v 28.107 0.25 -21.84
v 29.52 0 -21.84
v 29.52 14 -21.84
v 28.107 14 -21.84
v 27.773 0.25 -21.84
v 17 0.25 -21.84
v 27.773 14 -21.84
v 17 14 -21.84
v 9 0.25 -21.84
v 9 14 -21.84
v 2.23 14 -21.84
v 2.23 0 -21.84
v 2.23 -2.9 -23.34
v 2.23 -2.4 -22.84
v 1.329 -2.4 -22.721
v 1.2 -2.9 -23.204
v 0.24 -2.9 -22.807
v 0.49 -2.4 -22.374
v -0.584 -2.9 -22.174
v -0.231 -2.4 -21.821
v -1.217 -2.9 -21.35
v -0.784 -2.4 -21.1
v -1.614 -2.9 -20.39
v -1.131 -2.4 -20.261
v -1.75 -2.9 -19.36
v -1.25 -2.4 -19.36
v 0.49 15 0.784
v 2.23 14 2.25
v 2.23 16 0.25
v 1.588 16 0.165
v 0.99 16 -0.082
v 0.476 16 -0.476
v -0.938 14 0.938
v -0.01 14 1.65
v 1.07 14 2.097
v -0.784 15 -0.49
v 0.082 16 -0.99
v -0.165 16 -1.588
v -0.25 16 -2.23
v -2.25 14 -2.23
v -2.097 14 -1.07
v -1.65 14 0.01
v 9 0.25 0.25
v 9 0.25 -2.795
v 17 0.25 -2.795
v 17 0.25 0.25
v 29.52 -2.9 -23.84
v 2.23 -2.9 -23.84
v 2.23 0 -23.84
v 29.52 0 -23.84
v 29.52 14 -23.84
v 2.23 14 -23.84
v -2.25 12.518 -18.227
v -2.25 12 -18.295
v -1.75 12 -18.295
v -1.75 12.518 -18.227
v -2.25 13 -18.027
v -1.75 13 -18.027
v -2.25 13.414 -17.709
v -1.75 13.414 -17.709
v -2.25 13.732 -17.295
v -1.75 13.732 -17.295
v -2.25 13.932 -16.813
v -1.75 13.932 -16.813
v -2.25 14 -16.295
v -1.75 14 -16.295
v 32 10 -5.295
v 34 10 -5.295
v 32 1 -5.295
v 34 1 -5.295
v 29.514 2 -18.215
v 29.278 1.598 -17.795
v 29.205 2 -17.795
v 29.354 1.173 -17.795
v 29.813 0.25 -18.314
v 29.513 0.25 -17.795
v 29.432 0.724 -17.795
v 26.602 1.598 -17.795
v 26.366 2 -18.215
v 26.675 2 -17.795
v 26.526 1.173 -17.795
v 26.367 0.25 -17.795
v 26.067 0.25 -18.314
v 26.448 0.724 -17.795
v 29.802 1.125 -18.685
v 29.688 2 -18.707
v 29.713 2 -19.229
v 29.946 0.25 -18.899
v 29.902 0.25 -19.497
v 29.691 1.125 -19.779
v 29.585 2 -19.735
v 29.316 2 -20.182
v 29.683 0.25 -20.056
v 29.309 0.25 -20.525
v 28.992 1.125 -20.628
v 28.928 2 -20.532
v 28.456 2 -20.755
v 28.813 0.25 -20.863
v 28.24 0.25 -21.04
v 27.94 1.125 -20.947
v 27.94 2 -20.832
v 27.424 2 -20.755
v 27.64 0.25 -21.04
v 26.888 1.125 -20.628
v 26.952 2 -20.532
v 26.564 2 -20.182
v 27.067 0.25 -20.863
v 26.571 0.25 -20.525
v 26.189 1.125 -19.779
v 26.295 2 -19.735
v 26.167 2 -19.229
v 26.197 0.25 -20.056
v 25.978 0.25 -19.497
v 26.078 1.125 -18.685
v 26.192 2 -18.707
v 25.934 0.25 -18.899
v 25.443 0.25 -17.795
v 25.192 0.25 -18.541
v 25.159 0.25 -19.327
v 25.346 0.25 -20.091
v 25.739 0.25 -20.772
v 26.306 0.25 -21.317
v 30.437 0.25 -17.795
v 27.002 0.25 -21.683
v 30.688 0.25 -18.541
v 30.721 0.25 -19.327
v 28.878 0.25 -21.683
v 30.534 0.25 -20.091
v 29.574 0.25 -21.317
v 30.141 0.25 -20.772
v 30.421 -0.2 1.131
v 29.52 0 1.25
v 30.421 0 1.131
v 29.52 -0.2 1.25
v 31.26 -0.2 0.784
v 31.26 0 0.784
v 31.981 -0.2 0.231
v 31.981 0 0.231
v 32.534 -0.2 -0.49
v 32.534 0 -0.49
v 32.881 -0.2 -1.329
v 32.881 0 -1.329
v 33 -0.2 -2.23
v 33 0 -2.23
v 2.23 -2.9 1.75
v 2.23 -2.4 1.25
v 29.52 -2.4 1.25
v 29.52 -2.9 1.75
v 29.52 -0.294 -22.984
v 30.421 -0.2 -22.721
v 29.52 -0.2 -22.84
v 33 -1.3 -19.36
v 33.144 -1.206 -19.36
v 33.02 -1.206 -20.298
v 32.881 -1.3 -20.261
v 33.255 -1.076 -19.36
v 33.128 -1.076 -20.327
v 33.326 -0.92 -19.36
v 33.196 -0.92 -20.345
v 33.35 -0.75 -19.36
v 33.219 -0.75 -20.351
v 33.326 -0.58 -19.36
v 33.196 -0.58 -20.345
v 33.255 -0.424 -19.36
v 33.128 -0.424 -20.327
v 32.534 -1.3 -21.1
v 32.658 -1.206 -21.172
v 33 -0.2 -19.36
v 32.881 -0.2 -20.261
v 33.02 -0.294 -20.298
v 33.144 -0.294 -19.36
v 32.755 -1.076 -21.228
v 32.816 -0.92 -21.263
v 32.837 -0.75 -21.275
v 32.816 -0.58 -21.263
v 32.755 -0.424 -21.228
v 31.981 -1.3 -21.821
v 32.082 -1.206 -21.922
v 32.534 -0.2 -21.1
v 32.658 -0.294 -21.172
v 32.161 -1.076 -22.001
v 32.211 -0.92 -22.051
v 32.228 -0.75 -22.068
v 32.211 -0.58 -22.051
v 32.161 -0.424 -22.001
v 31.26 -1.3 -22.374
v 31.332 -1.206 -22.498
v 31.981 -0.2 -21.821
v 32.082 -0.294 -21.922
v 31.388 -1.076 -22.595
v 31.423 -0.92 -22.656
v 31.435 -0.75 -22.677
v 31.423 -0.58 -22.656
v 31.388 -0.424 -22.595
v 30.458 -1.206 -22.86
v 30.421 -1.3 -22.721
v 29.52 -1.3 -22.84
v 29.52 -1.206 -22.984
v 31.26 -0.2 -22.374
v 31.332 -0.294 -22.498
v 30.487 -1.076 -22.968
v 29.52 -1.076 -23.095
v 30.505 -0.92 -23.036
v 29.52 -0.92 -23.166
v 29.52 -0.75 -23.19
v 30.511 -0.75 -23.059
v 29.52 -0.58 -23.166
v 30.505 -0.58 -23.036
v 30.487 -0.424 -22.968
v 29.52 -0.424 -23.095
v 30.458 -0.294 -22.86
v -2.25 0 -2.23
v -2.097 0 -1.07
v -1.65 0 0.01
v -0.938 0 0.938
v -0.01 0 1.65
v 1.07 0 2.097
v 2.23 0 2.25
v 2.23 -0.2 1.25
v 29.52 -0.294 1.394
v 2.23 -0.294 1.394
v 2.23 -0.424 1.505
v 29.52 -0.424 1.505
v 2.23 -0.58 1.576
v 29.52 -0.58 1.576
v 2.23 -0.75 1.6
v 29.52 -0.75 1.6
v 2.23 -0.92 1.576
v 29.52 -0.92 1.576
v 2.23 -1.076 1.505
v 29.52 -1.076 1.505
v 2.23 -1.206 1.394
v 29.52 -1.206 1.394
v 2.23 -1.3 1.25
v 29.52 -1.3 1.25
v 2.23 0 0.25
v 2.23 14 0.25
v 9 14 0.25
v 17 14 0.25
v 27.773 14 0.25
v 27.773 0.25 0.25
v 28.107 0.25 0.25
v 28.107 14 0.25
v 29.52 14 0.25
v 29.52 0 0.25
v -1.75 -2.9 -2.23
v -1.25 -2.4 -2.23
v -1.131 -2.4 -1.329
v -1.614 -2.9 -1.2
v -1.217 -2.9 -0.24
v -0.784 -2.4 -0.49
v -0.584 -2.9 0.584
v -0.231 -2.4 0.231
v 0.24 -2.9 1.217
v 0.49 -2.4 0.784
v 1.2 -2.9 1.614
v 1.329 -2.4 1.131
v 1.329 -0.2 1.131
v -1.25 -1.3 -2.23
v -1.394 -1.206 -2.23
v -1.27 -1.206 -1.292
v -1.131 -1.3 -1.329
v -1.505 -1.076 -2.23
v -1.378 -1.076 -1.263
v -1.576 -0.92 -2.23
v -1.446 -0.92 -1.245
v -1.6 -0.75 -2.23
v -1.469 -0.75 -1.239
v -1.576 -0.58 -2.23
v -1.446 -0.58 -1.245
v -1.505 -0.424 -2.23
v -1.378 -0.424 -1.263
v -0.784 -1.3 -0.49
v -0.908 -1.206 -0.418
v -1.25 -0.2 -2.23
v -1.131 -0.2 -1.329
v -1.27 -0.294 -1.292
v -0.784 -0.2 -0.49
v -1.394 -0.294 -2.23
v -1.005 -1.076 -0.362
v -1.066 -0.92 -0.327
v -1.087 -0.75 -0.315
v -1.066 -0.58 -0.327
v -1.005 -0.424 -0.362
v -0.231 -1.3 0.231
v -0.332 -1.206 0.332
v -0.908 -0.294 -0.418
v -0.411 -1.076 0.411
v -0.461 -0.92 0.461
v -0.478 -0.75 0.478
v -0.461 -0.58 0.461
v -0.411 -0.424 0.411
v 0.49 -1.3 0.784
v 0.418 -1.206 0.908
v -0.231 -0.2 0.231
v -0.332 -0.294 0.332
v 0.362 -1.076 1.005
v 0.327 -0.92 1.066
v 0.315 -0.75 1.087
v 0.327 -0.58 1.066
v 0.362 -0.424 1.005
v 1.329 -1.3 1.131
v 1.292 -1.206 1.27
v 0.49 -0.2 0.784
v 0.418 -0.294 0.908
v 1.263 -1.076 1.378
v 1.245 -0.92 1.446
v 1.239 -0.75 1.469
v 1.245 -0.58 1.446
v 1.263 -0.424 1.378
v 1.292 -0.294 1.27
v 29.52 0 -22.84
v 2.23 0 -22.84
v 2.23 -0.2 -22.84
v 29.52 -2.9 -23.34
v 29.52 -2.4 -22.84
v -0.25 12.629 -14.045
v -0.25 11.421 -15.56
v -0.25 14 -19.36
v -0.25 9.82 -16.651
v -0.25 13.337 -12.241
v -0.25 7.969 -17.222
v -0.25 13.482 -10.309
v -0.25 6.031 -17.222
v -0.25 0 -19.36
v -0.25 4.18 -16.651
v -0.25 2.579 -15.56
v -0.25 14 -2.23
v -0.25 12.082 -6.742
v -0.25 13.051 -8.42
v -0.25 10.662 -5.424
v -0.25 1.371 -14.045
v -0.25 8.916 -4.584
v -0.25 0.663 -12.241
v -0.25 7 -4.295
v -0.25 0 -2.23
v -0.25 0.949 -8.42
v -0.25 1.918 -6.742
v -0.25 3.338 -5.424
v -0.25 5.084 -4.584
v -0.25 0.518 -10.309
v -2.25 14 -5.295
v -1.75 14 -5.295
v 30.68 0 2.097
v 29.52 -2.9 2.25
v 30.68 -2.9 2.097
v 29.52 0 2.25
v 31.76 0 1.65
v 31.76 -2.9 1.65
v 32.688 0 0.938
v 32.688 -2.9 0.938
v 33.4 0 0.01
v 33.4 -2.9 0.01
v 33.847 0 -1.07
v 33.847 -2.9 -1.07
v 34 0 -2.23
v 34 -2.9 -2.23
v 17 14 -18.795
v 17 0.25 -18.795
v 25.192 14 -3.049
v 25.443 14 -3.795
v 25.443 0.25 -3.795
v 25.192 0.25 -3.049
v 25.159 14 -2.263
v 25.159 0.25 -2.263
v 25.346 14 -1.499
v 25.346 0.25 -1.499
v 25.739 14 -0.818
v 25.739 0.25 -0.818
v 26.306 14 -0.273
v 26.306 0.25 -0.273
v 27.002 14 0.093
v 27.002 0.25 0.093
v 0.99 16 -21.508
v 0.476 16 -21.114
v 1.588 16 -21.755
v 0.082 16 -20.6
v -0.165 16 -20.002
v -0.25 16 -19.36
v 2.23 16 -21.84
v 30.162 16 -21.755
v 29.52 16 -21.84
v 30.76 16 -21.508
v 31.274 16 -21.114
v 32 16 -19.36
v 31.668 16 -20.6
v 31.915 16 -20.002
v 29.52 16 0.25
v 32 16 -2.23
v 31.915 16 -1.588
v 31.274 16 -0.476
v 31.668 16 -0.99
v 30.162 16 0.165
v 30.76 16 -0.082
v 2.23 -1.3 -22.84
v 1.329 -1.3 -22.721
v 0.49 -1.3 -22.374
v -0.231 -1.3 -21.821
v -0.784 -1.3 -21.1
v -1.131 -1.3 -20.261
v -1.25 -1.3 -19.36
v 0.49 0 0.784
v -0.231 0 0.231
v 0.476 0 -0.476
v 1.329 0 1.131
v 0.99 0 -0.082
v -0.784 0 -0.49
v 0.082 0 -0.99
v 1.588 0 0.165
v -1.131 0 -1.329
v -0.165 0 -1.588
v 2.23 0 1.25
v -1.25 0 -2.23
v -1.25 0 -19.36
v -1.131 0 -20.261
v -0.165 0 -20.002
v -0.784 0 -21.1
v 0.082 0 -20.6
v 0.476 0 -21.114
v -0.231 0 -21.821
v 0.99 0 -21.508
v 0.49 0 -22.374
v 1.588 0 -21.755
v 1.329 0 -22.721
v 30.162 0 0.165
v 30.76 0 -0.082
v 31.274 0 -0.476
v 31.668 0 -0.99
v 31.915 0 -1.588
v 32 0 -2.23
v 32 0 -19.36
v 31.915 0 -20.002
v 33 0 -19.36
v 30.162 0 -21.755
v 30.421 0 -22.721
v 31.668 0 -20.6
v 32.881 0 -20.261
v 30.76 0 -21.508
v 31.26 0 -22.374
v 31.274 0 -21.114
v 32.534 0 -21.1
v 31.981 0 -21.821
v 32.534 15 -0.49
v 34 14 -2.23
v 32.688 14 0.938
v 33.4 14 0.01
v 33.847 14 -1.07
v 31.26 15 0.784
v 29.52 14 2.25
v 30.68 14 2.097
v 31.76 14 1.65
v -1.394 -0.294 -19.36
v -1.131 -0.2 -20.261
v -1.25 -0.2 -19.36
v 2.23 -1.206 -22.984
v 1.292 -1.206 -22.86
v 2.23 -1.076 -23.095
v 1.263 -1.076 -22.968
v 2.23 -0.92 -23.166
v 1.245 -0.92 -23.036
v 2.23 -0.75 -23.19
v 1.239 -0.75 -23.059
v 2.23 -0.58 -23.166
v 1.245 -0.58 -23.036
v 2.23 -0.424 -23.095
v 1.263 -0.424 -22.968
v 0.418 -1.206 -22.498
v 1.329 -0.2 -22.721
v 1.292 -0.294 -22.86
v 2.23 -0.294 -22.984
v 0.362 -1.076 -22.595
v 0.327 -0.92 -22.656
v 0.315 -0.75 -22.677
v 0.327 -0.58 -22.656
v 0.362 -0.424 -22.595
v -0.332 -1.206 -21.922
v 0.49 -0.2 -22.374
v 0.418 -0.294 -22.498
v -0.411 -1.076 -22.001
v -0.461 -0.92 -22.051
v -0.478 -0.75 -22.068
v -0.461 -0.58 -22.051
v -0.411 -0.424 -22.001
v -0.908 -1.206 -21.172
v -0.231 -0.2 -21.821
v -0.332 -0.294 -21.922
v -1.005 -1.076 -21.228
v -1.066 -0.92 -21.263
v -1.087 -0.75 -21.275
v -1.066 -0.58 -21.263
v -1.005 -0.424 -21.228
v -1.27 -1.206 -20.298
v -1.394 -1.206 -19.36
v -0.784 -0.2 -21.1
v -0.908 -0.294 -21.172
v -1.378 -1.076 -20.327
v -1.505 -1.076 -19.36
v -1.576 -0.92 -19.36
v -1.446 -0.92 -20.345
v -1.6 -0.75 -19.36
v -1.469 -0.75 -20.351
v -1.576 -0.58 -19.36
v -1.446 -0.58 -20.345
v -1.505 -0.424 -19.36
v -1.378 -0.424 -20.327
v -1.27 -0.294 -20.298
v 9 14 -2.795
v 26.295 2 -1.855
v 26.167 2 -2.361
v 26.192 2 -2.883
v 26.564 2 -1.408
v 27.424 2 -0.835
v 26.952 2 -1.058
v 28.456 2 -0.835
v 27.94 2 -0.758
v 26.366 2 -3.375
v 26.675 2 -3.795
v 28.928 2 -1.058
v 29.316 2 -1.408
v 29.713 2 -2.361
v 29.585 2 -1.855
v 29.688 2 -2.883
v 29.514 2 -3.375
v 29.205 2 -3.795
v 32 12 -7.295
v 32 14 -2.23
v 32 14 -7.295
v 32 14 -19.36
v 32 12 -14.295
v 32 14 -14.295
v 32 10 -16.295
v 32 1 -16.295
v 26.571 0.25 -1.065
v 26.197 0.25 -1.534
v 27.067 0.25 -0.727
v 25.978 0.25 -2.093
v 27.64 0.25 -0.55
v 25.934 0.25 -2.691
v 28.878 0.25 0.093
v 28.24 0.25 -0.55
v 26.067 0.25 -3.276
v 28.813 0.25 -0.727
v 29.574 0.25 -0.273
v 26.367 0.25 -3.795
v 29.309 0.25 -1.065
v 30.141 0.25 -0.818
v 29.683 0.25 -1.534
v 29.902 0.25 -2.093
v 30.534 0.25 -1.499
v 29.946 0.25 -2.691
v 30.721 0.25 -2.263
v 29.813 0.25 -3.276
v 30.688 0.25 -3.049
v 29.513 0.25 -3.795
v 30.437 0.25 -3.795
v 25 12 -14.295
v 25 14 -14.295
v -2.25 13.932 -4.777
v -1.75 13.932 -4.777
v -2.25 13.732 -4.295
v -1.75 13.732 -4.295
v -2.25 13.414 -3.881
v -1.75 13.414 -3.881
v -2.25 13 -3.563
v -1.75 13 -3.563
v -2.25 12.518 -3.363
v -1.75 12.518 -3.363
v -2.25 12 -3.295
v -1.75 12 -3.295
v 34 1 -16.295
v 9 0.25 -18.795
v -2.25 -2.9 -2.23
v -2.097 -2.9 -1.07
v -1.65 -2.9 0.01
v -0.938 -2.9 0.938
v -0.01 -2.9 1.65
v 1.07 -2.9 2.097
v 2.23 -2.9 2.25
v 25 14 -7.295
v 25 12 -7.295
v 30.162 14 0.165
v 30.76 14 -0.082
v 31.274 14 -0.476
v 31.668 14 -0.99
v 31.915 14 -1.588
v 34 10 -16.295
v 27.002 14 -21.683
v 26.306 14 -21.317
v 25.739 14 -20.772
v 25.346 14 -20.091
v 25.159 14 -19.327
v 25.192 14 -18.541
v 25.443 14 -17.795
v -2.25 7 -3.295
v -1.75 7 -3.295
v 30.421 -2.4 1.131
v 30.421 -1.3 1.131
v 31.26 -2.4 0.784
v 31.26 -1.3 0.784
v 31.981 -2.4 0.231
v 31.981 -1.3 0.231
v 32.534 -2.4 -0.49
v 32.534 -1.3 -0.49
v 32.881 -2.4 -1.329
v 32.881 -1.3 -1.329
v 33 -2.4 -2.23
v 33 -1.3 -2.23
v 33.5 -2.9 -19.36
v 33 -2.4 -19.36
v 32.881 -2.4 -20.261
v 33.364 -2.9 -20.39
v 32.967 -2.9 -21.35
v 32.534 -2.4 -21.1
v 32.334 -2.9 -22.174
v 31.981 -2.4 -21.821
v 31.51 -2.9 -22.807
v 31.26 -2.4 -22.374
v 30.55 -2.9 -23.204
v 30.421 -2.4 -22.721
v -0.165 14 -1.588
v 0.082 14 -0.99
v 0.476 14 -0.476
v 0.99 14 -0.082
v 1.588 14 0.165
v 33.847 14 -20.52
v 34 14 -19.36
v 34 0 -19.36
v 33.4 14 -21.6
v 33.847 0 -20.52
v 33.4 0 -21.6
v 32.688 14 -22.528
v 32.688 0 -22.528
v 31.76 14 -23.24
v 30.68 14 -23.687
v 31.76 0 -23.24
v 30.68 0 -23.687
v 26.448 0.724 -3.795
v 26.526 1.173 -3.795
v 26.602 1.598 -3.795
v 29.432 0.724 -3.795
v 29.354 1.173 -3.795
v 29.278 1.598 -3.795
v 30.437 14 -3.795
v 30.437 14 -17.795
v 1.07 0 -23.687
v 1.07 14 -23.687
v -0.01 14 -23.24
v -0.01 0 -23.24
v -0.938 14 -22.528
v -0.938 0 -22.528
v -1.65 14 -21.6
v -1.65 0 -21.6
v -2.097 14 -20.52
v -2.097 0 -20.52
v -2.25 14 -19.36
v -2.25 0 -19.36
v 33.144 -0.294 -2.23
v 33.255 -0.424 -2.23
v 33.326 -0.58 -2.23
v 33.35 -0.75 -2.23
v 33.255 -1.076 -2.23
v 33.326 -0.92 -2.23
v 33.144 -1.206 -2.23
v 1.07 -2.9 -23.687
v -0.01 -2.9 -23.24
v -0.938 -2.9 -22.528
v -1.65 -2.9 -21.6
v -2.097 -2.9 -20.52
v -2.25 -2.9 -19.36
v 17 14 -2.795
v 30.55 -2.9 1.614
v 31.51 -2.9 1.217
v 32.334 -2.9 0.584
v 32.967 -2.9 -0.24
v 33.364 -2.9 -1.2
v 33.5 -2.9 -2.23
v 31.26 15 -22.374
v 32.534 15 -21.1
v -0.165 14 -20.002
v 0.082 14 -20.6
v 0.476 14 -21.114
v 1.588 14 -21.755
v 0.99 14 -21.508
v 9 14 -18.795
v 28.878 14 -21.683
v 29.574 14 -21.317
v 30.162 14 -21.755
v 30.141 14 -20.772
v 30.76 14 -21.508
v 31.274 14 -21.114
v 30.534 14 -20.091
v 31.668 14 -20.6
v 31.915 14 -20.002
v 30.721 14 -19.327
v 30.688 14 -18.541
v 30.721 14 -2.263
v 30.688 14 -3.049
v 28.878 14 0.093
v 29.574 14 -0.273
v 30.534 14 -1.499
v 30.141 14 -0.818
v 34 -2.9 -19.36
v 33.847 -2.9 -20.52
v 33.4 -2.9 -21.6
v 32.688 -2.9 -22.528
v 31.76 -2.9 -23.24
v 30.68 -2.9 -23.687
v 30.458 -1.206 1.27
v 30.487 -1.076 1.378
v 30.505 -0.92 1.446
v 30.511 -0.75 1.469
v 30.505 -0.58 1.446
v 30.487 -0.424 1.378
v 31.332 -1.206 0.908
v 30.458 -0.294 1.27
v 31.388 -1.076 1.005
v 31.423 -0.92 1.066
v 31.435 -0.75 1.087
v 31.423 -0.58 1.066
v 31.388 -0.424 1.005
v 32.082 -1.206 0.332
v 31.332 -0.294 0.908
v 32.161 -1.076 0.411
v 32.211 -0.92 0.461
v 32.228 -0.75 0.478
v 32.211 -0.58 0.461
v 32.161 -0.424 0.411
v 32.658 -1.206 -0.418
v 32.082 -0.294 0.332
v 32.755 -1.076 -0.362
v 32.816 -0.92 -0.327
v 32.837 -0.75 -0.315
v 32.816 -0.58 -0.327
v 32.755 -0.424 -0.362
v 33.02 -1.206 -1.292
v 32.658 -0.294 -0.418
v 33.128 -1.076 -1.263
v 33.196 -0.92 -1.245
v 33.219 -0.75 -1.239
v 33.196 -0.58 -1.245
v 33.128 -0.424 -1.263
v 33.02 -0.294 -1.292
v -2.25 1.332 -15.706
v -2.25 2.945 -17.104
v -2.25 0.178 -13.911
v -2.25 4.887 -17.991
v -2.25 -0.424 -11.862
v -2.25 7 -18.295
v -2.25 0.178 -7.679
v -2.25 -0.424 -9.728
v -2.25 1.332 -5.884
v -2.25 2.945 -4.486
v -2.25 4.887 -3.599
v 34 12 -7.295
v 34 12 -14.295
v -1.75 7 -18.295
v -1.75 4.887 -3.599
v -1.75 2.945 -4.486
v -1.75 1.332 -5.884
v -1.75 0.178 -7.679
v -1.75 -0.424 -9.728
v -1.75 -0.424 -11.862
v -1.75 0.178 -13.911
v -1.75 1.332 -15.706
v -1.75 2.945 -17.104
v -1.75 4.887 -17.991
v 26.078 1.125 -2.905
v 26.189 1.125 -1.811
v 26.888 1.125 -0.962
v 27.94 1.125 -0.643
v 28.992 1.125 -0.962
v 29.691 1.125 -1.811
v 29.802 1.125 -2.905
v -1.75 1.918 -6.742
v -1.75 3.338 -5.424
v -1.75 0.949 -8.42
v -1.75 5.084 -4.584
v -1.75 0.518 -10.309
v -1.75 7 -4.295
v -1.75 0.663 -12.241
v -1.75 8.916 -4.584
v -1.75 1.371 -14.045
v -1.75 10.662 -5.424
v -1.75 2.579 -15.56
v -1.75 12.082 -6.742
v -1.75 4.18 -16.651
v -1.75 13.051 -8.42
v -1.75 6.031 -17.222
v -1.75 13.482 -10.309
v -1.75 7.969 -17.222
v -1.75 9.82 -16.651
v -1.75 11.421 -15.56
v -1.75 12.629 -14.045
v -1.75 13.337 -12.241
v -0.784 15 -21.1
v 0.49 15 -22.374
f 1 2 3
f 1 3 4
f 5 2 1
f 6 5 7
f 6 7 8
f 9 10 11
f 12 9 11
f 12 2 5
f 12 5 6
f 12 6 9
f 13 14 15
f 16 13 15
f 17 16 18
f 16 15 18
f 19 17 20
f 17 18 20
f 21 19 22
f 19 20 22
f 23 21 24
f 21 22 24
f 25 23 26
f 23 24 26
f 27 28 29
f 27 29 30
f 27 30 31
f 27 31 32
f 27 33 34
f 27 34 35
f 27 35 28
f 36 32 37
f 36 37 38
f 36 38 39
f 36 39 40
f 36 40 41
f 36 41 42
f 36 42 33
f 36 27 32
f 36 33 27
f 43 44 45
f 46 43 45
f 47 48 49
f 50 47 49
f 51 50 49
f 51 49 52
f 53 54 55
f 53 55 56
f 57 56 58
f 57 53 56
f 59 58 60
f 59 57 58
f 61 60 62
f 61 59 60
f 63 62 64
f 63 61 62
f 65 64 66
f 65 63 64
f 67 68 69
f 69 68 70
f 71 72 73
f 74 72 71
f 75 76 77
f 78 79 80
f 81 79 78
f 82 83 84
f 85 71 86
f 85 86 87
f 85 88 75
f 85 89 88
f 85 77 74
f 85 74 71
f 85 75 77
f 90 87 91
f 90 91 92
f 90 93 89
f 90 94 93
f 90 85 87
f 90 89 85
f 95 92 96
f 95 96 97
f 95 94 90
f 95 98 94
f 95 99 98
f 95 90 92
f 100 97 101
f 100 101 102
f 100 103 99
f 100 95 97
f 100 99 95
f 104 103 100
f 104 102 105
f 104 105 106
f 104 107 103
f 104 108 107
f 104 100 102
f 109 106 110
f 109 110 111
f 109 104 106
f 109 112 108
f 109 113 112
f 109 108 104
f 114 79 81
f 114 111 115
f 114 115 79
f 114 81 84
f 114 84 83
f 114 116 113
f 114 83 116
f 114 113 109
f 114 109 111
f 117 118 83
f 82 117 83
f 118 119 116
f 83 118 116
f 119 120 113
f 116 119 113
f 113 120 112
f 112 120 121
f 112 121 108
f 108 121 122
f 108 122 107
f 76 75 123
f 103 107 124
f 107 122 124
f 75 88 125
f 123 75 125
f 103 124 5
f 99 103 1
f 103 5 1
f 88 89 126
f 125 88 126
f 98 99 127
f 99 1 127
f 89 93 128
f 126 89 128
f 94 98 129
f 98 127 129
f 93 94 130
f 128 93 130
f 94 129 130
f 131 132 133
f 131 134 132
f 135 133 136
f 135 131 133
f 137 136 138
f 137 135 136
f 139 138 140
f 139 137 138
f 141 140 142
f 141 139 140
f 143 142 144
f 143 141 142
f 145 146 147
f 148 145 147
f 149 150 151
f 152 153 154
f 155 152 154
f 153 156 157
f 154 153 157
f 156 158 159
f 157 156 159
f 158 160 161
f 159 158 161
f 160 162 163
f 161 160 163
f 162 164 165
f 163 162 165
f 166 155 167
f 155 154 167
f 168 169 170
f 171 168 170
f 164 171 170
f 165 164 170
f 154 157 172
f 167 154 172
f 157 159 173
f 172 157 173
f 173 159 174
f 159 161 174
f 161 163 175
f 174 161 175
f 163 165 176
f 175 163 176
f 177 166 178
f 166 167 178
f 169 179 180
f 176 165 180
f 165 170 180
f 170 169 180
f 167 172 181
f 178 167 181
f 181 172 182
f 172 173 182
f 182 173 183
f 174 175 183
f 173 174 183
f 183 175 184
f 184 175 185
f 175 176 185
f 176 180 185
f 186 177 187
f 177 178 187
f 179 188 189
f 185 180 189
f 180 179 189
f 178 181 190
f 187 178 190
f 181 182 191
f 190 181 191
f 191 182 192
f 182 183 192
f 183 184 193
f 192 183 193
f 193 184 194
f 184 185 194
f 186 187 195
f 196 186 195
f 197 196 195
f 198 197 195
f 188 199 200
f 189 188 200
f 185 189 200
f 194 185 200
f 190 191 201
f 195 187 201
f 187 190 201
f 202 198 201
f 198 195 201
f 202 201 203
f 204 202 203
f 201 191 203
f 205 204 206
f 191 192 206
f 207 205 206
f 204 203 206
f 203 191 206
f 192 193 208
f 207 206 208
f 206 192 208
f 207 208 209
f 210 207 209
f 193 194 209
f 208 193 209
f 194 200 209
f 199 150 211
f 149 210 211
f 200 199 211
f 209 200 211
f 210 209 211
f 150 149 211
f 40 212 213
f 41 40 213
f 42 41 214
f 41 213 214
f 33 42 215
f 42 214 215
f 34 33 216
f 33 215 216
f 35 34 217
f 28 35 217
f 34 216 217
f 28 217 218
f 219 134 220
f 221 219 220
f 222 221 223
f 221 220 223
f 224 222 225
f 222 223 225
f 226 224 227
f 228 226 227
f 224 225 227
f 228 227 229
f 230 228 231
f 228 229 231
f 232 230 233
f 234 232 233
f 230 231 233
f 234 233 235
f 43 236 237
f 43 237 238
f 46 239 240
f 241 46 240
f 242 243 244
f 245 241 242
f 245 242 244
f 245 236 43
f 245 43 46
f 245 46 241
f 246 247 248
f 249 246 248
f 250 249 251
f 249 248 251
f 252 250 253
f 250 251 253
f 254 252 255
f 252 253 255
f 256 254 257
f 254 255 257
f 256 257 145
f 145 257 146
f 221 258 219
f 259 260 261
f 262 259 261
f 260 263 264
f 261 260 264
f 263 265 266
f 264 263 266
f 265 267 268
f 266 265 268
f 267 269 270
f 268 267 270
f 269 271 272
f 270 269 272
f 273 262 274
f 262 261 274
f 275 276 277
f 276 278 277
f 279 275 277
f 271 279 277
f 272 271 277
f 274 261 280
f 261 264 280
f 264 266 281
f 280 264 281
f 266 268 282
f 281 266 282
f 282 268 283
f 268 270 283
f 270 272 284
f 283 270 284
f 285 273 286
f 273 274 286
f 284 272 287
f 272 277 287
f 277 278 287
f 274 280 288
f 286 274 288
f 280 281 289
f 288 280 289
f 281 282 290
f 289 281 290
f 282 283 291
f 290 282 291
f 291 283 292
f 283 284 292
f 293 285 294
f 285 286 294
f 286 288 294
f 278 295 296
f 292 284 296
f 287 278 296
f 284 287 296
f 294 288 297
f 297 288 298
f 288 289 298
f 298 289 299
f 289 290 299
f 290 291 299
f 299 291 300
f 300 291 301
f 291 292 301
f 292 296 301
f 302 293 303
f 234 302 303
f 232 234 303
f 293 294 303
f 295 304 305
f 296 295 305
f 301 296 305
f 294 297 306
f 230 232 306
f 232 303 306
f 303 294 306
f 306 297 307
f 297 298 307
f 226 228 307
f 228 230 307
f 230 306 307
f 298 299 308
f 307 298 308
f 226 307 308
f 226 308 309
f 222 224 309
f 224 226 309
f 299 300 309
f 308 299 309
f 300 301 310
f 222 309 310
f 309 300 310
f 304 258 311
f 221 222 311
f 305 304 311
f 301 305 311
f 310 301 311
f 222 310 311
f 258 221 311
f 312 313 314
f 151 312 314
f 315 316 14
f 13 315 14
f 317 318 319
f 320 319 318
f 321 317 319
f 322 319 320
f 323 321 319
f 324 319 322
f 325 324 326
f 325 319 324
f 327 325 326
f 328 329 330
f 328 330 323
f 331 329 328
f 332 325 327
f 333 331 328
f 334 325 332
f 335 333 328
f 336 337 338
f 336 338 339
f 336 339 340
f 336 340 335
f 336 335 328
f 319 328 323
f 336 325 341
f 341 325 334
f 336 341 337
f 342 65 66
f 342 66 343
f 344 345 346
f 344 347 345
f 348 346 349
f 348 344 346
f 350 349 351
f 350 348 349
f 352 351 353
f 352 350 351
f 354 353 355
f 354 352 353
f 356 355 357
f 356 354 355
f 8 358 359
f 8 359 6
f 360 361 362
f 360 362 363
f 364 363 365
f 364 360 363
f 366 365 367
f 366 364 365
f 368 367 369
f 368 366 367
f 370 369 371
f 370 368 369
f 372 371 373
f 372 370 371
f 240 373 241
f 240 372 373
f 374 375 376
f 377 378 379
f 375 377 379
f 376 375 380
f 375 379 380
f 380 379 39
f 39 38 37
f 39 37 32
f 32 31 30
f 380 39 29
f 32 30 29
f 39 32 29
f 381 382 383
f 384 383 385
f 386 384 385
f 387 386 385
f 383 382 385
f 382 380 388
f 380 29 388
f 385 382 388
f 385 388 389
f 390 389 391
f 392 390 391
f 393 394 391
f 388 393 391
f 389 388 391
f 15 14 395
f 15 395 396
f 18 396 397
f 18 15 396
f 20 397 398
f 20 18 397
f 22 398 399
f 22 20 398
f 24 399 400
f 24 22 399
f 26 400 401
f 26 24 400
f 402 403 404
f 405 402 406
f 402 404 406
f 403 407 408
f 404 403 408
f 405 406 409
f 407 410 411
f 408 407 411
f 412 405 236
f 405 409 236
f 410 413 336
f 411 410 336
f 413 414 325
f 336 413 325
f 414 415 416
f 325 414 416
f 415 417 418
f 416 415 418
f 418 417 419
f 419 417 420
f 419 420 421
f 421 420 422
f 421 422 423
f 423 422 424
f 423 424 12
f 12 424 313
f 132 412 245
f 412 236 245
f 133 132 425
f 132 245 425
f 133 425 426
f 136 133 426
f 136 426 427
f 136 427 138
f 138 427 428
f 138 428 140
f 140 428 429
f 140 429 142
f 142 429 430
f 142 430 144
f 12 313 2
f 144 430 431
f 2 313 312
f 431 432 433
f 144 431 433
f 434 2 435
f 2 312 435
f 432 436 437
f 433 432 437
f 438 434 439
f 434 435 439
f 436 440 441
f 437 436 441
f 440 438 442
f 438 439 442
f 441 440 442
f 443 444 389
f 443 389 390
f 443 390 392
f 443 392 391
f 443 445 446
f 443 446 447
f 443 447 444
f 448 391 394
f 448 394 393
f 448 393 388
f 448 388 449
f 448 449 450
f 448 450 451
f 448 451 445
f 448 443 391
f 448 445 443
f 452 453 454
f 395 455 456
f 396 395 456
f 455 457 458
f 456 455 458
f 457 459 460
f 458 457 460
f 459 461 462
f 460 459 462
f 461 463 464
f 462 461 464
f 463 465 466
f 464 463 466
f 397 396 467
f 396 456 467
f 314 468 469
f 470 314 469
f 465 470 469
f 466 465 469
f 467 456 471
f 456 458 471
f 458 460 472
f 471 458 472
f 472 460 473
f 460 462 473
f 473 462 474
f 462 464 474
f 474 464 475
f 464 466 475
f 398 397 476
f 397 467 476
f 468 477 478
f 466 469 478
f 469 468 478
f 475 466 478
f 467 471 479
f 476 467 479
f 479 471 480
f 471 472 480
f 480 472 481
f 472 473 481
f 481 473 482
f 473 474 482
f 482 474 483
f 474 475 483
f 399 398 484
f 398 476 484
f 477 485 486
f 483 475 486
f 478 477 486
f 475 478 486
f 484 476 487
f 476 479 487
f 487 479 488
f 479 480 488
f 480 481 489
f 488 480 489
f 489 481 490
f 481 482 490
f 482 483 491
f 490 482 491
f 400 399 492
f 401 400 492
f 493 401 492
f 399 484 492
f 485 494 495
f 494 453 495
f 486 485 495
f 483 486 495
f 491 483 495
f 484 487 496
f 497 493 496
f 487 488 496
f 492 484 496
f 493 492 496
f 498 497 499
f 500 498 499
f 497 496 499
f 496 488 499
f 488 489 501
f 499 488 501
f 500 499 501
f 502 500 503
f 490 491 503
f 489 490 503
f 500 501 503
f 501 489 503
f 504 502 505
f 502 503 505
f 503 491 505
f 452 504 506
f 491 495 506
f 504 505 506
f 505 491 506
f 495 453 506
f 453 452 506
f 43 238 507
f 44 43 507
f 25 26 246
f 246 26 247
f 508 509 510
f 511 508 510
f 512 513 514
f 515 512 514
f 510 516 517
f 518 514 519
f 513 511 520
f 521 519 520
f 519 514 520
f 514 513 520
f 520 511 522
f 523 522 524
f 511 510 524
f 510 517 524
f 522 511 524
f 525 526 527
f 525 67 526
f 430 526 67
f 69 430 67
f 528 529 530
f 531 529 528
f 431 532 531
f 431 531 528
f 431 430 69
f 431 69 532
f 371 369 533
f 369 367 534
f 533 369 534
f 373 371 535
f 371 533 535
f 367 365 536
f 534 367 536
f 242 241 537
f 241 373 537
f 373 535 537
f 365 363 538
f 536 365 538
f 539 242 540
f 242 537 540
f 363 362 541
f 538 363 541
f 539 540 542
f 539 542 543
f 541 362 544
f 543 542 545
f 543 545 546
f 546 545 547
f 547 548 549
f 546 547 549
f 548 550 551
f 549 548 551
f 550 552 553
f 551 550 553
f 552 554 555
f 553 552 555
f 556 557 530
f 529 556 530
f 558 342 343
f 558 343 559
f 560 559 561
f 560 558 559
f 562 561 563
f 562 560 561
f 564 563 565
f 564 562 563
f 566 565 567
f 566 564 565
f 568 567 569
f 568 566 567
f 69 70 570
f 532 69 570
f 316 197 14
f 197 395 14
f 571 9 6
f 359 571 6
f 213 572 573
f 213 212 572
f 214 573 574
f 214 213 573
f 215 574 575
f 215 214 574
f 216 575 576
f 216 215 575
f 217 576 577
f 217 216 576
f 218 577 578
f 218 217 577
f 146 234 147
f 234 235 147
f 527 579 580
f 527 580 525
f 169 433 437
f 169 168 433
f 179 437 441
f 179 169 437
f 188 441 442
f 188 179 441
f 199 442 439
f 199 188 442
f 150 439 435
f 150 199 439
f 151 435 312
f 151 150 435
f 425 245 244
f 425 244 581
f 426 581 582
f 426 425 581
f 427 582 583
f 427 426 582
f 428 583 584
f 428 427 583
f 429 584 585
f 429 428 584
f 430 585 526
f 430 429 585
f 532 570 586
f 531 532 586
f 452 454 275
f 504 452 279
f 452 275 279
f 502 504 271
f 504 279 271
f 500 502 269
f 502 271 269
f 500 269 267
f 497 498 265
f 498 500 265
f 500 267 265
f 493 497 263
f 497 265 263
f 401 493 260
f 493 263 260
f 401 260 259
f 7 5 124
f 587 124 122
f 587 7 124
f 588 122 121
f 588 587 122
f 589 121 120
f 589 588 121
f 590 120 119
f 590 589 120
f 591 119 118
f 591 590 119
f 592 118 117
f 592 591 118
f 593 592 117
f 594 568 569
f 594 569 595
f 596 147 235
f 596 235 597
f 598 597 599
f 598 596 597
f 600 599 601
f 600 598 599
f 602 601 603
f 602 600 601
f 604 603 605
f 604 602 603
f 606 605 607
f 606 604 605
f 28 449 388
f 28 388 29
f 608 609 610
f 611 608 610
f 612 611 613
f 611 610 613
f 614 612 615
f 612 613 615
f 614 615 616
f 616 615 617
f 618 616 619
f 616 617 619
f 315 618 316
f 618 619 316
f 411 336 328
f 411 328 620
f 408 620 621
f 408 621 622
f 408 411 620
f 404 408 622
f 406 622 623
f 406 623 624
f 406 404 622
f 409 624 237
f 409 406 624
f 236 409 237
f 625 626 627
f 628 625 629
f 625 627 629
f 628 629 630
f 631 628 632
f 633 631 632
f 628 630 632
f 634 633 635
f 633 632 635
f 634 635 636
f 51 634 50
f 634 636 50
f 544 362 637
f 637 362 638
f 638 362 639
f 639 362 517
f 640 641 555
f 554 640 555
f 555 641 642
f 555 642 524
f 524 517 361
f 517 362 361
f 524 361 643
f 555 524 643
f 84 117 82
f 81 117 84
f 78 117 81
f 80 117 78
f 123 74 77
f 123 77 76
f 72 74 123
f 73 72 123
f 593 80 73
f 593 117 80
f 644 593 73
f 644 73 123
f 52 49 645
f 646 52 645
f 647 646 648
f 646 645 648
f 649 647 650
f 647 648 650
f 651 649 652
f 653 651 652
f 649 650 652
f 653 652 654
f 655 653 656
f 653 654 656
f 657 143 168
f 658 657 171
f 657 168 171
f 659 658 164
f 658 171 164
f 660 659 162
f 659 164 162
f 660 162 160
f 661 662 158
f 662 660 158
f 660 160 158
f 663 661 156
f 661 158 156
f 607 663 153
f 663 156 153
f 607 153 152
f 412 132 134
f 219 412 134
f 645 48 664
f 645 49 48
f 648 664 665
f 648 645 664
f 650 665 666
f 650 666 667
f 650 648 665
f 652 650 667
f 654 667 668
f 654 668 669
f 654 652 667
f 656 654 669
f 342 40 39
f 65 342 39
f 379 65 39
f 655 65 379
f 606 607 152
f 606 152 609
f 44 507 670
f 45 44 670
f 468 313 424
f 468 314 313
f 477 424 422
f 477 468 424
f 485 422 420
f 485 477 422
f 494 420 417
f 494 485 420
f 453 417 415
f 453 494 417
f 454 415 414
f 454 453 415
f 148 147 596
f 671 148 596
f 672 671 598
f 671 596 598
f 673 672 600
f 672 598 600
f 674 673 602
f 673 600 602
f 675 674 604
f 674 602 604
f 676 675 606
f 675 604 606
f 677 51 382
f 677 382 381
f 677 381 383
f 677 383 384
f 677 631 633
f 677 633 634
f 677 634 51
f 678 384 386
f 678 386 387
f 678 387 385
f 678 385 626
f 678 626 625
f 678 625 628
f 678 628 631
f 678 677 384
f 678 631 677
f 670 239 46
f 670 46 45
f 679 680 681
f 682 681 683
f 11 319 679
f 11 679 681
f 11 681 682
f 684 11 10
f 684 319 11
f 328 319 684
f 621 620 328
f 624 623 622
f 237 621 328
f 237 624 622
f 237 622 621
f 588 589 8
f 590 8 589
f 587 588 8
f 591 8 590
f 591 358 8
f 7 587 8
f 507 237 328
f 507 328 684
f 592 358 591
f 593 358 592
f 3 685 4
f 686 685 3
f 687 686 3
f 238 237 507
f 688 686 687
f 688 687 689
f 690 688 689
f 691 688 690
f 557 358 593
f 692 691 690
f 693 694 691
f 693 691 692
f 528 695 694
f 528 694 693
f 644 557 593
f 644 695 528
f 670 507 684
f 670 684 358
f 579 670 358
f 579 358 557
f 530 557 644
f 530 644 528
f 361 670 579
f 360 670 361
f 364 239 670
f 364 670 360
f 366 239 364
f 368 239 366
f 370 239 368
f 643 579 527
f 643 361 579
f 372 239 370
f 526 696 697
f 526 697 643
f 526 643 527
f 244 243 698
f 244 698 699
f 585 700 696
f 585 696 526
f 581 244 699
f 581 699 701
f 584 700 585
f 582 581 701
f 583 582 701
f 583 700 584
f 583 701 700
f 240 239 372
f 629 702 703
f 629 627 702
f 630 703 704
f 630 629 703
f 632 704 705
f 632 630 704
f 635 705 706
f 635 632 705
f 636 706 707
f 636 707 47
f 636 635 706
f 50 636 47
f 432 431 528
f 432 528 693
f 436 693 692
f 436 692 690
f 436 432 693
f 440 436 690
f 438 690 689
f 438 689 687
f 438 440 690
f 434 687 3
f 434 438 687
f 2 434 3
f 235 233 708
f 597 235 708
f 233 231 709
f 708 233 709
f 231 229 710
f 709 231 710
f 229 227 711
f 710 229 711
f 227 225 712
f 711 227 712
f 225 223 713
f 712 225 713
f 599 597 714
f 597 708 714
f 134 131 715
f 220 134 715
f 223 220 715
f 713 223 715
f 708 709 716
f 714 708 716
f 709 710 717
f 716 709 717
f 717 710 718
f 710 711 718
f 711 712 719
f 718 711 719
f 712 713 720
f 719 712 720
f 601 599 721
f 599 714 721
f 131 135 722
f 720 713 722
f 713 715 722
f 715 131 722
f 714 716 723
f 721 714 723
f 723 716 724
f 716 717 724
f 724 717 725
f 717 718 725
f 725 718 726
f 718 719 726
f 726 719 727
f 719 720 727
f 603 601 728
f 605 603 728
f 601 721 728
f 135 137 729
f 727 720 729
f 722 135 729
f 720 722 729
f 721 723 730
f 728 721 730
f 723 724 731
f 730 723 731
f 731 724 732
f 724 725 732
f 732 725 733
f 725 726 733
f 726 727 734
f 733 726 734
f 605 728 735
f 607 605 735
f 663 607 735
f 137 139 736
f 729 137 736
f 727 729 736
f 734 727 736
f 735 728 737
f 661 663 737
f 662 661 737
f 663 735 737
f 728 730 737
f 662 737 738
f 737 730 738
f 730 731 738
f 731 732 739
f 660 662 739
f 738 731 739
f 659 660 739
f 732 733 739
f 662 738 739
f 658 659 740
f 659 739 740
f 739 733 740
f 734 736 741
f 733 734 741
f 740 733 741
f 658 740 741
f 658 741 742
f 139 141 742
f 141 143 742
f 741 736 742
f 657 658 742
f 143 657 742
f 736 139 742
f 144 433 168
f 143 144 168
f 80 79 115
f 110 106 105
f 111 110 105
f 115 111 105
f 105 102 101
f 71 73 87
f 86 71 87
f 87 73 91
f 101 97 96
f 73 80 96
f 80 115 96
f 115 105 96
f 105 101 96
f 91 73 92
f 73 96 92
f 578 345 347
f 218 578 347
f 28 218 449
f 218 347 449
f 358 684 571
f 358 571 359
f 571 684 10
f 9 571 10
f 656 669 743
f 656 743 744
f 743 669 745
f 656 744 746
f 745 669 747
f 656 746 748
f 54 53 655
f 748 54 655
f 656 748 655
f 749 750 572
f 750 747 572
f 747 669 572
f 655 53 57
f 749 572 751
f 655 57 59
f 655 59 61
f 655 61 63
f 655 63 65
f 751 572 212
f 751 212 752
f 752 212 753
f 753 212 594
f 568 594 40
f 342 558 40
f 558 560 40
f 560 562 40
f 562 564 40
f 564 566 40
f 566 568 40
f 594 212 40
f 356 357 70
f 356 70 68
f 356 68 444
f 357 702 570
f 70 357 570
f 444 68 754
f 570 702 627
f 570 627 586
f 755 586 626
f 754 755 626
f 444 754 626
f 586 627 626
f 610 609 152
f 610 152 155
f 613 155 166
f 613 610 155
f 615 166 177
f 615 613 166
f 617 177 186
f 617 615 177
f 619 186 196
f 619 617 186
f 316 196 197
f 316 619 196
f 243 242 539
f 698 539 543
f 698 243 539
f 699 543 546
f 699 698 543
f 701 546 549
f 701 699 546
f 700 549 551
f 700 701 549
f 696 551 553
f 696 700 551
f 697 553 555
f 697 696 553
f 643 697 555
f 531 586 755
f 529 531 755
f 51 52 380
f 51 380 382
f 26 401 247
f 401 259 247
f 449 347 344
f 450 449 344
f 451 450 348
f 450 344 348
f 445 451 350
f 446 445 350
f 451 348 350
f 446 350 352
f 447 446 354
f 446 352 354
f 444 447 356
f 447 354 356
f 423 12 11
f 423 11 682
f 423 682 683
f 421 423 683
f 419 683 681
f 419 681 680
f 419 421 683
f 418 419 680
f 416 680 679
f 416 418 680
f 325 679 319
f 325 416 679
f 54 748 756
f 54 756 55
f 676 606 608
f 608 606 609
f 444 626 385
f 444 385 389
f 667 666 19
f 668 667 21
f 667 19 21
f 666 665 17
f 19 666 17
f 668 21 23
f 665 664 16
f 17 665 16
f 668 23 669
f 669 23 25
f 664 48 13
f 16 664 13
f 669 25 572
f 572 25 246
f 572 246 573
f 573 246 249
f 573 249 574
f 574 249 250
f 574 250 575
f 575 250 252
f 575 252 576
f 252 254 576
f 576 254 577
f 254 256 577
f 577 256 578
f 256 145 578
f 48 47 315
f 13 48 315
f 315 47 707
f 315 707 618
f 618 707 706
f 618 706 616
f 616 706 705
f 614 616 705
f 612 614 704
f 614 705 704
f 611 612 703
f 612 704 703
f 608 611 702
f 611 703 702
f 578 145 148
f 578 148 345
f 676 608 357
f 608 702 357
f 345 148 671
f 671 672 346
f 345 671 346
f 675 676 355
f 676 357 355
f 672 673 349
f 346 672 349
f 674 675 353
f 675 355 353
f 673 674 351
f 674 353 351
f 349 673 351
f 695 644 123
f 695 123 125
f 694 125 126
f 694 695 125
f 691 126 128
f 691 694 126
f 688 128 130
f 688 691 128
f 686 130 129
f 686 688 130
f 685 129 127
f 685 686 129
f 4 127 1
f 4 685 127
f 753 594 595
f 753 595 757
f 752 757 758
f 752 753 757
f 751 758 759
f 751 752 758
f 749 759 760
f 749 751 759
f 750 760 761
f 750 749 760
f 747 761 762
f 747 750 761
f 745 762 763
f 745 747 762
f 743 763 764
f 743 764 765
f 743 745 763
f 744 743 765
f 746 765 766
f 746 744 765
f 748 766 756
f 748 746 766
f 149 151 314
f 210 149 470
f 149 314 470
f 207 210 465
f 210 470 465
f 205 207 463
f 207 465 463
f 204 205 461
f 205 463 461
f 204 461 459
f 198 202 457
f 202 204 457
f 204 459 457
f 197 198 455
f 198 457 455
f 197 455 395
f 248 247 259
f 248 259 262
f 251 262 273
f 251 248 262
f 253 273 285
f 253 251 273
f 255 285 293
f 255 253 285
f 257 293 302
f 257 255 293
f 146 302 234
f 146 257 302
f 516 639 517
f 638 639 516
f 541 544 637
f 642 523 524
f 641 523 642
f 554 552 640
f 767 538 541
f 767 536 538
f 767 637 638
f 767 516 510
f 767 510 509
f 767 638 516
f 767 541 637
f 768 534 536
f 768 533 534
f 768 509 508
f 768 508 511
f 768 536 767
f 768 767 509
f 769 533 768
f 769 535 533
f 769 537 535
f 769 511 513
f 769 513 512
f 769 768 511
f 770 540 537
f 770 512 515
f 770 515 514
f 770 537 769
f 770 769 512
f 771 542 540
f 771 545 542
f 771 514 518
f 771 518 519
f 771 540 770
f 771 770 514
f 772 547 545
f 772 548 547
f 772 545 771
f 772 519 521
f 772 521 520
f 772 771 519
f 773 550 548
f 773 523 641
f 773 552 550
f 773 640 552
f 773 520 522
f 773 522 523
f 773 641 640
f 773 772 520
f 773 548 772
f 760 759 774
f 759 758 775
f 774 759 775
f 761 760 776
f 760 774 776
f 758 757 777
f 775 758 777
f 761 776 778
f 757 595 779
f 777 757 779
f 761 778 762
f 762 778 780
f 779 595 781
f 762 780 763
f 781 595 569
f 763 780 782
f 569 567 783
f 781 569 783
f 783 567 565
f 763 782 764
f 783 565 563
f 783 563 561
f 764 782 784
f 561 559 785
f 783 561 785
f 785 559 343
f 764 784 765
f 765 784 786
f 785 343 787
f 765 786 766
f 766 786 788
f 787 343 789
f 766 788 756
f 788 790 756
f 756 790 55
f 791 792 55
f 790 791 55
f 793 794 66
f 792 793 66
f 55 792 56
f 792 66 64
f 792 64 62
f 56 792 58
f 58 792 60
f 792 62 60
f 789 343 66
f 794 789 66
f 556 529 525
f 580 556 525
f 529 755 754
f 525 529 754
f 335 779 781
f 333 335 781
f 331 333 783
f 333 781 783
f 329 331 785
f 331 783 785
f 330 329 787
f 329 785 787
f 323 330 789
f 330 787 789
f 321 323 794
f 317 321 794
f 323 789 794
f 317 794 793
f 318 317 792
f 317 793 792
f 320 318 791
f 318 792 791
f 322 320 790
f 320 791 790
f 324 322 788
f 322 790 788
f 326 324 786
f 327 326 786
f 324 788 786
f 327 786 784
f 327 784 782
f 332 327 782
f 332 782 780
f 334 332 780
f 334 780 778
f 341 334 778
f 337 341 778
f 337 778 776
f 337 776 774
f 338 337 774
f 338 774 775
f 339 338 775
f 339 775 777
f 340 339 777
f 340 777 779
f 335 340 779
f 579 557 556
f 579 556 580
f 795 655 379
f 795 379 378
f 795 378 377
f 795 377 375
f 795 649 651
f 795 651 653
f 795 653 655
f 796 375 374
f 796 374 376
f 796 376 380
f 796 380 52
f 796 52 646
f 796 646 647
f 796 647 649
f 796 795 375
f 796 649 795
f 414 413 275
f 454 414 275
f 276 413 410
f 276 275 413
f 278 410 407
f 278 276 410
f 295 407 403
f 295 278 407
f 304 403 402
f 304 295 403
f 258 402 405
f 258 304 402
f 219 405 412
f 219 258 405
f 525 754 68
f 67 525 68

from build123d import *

# Parameters (mm, degrees)
MAIN_EXTRUSION_DEPTH             = 14
TAPERED_BOTTOM_DEPTH             = 2
TAPERED_BOTTOM_DRAFT             = -45
SKETCH4_R                        = 2.795
SKETCH4_W                        = 8
SKETCH4_H                        = 3.045
PCB_SUPPORT_DEPTH                = 13.75
SKETCH5_R                        = 2.045
GUIDE_PIN_CUTOUT_DEPTH           = 2
GUIDE_PIN_CUTOUT_DRAFT           = 7.5
GUIDE_PIN_CUTOUT_PROFILE_2_DEPTH = 2
GUIDE_PIN_CUTOUT_PROFILE_2_DRAFT = 7.5
SKETCH12_W                       = 4.994797294
SKETCH12_H                       = 14
CUT_EXTRUDE6_DEPTH               = 13.75
SKETCH11_W                       = 7
SKETCH11_H                       = 7
BOSS_EXTRUDE1_DEPTH              = 2
CUT_EXTRUDE2_REACH               = 48.243
SKETCH8_R                        = 6.5
CUT_EXTRUDE4_DEPTH               = 0.5
CUT_EXTRUDE5_REACH               = 48.243
CHAMFER1_SIZE                    = 0.5


with BuildPart() as part:
    # Sketch2 → main-extrusion (new body)
    with BuildSketch(Plane(origin=(0, 0, 0), x_dir=(1, 0, 0), z_dir=(0, 1, 0))):
        with BuildLine():
            Line((-2.25, 19.36), (-2.25, 2.23))
            ThreePointArc((-2.25, 2.23), (-0.93783838, -0.93783838), (2.23, -2.25))
            Line((2.23, -2.25), (29.52, -2.25))
            ThreePointArc((29.52, -2.25), (32.68783838, -0.93783838), (34, 2.23))
            Line((34, 2.23), (34, 19.36))
            ThreePointArc((34, 19.36), (32.68783838, 22.52783838), (29.52, 23.84))
            Line((29.52, 23.84), (2.23, 23.84))
            ThreePointArc((2.23, 23.84), (-0.93783838, 22.52783838), (-2.25, 19.36))
        make_face()
        with BuildLine():
            Line((-0.25, 19.36), (-0.25, 2.23))
            ThreePointArc((-0.25, 2.23), (0.476375183, 0.476375183), (2.23, -0.25))
            Line((2.23, -0.25), (29.52, -0.25))
            ThreePointArc((29.52, -0.25), (31.273624817, 0.476375183), (32, 2.23))
            Line((32, 2.23), (32, 19.36))
            ThreePointArc((32, 19.36), (31.273624817, 21.113624817), (29.52, 21.84))
            Line((29.52, 21.84), (2.23, 21.84))
            ThreePointArc((2.23, 21.84), (0.476375183, 21.113624817), (-0.25, 19.36))
        make_face(mode=Mode.SUBTRACT)
    extrude(amount=MAIN_EXTRUSION_DEPTH)


with BuildPart() as tapered_bottom_tool:
    # Sketch3 → tapered-bottom (with draft: the straight prism first)
    with BuildSketch(Plane.XZ.offset(-14)):
        with BuildLine():
            ThreePointArc((-2.25, -19.36), (-0.93783838, -22.52783838), (2.23, -23.84))
            Line((2.23, -23.84), (29.52, -23.84))
            ThreePointArc((29.52, -23.84), (32.68783838, -22.52783838), (34, -19.36))
            Line((34, -19.36), (34, -2.23))
            ThreePointArc((34, -2.23), (32.68783838, 0.93783838), (29.52, 2.25))
            Line((29.52, 2.25), (2.23, 2.25))
            ThreePointArc((2.23, 2.25), (-0.93783838, 0.93783838), (-2.25, -2.23))
            Line((-2.25, -2.23), (-2.25, -19.36))
        make_face()
    extrude(amount=-TAPERED_BOTTOM_DEPTH)
    # tapered-bottom: the draft: its side faces are tilted about the plane it starts from
    tapered_bottom_sides = [tapered_bottom_tool.faces().sort_by_distance(p)[0] for p in [
        (-0.93783838, 15, -22.52783838),
        (15.875, 15, -23.84),
        (32.68783838, 15, -22.52783838),
        (34, 15, -10.795),
        (32.68783838, 15, 0.93783838),
        (15.875, 15, 2.25),
        (-0.93783838, 15, 0.93783838),
        (-2.25, 15, -10.795),
    ]]
    draft(tapered_bottom_sides, Plane.XZ.offset(-14), TAPERED_BOTTOM_DRAFT)


with BuildPart() as part_1:
    add(part.part)

    # tapered-bottom: add tapered_bottom_tool
    add(tapered_bottom_tool.part)

    # Sketch4 → PCB-support (add)
    with BuildSketch(Plane(origin=(0, 14, 0), x_dir=(1, 0, 0), z_dir=(0, 1, 0))):
        with Locations((27.94, 19.05)):
            Circle(SKETCH4_R)
        with Locations((27.94, 2.54)):
            Circle(SKETCH4_R)
        with Locations((13, 20.3175)):
            Rectangle(SKETCH4_W, SKETCH4_H)
        with Locations((13, 1.2725)):
            Rectangle(SKETCH4_W, SKETCH4_H)
    extrude(amount=-PCB_SUPPORT_DEPTH)


with BuildPart() as guide_pin_cutout_tool:
    # Sketch5 → guide-pin-cutout (with draft: the straight prism first)
    with BuildSketch(Plane(origin=(0, 0, 0), x_dir=(1, 0, 0), z_dir=(0, 1, 0))):
        with Locations((27.94, 19.05)):
            Circle(SKETCH5_R)
    extrude(amount=GUIDE_PIN_CUTOUT_DEPTH)
    # guide-pin-cutout: the draft: its side faces are tilted about the plane it starts from
    guide_pin_cutout_sides = [guide_pin_cutout_tool.faces().sort_by_distance(p)[0] for p in [
        (25.895, 1, -19.05),
    ]]
    draft(guide_pin_cutout_sides, Plane(origin=(0, 0, 0), x_dir=(1, 0, 0), z_dir=(0, 1, 0)), GUIDE_PIN_CUTOUT_DRAFT)


with BuildPart() as part_2:
    add(part_1.part)

    # guide-pin-cutout: cut by guide_pin_cutout_tool
    add(guide_pin_cutout_tool.part, mode=Mode.SUBTRACT)


with BuildPart() as guide_pin_cutout_profile_2_tool:
    # Sketch5 → guide-pin-cutout profile 2 (with draft: the straight prism first)
    with BuildSketch(Plane(origin=(0, 0, 0), x_dir=(1, 0, 0), z_dir=(0, 1, 0))):
        with Locations((27.94, 2.54)):
            Circle(SKETCH5_R)
    extrude(amount=GUIDE_PIN_CUTOUT_PROFILE_2_DEPTH)
    # guide-pin-cutout profile 2: the draft: its side faces are tilted about the plane it starts from
    guide_pin_cutout_profile_2_sides = [guide_pin_cutout_profile_2_tool.faces().sort_by_distance(p)[0] for p in [
        (25.895, 1, -2.54),
    ]]
    draft(guide_pin_cutout_profile_2_sides, Plane(origin=(0, 0, 0), x_dir=(1, 0, 0), z_dir=(0, 1, 0)), GUIDE_PIN_CUTOUT_PROFILE_2_DRAFT)


with BuildPart() as part_3:
    add(part_2.part)

    # guide-pin-cutout profile 2: cut by guide_pin_cutout_profile_2_tool
    add(guide_pin_cutout_profile_2_tool.part, mode=Mode.SUBTRACT)

    # Sketch12 → Cut-Extrude6 (cut)
    with BuildSketch(Plane.XZ.offset(-14)):
        with Locations((27.94, -10.795)):
            Rectangle(SKETCH12_W, SKETCH12_H)
    extrude(amount=CUT_EXTRUDE6_DEPTH, mode=Mode.SUBTRACT)

    # Sketch11 → Boss-Extrude1 (add)
    with BuildSketch(Plane.XZ.offset(-14)):
        with Locations((28.5, -10.795)):
            Rectangle(SKETCH11_W, SKETCH11_H)
    extrude(amount=BOSS_EXTRUDE1_DEPTH)

    # top-hook: sweep along a path in path
    with BuildLine(Plane.XZ) as top_hook_path:
        Line((2.23, 0.25), (29.52, 0.25))
        ThreePointArc((29.52, 0.25), (31.273624817, -0.476375183), (32, -2.23))
        Line((32, -2.23), (32, -19.36))
        ThreePointArc((32, -19.36), (31.273624817, -21.113624817), (29.52, -21.84))
        Line((29.52, -21.84), (2.23, -21.84))
        ThreePointArc((2.23, -21.84), (0.476375183, -21.113624817), (-0.25, -19.36))
        Line((-0.25, -19.36), (-0.25, -2.23))
        ThreePointArc((-0.25, -2.23), (0.476375183, -0.476375183), (2.23, 0.25))
    # hook → top-hook (sweep)
    with BuildSketch(Plane(origin=(29.52, 0, 0), x_dir=(0, 0, -1), z_dir=(1, 0, 0))):
        with BuildLine():
            Line((22.84, -2.9), (22.84, -1.3))
            ThreePointArc((22.84, -1.3), (23.19, -0.75), (22.84, -0.2))
            Line((22.84, -0.2), (22.84, 0))
            Line((22.84, 0), (23.84, 0))
            Line((23.84, 0), (23.84, -2.9))
            Line((23.84, -2.9), (22.84, -2.9))
        make_face()
    sweep(path=top_hook_path.line)

    # Sketch8 → Cut-Extrude2 (cut, up to next)
    with BuildSketch(Plane.ZY.offset(2.25), mode=Mode.PRIVATE) as cut_extrude2_sk1:
        with Locations((-10.795, 7)):
            Circle(SKETCH8_R)
    cut_extrude2_tool1 = extrude(cut_extrude2_sk1.sketch, amount=-CUT_EXTRUDE2_REACH, mode=Mode.PRIVATE) & part_3.part
    add(cut_extrude2_tool1.solids().sort_by_distance((-2.25, 7, -10.795))[0], mode=Mode.SUBTRACT)

    # Sketch9 → Cut-Extrude4 (cut)
    with BuildSketch(Plane.ZY.offset(2.25)):
        with BuildLine():
            Line((-18.295, 7), (-18.295, 12))
            ThreePointArc((-18.295, 12), (-17.709213562, 13.414213562), (-16.295, 14))
            Line((-16.295, 14), (-5.295, 14))
            ThreePointArc((-5.295, 14), (-3.880786438, 13.414213562), (-3.295, 12))
            Line((-3.295, 12), (-3.295, 7))
            ThreePointArc((-3.295, 7), (-10.795, -0.5), (-18.295, 7))
        make_face()
    extrude(amount=-CUT_EXTRUDE4_DEPTH, mode=Mode.SUBTRACT)

    # Sketch10 → Cut-Extrude5 (cut, up to next)
    with BuildSketch(Plane(origin=(34, 0, 0), x_dir=(0, 0, -1), z_dir=(1, 0, 0)), mode=Mode.PRIVATE) as cut_extrude5_sk1:
        Polygon((5.295, 1), (16.295, 1), (16.295, 10), (14.295, 12), (7.295, 12), (5.295, 10), align=None)
    cut_extrude5_tool1 = extrude(cut_extrude5_sk1.sketch, amount=-CUT_EXTRUDE5_REACH, mode=Mode.PRIVATE) & part_3.part
    add(cut_extrude5_tool1.solids().sort_by_distance((34, 6.334758, -10.795))[0], mode=Mode.SUBTRACT)

    # Chamfer1
    chamfer1_edges = [part_3.edges().sort_by_distance(p)[0] for p in [
        (15.875, -2.9, -22.84),
        (-0.230731599, -2.9, -21.820731599),
        (-1.25, -2.9, -10.795),
        (-0.230731599, -2.9, 0.230731599),
        (15.875, -2.9, 1.25),
        (31.980731599, -2.9, 0.230731599),
        (33, -2.9, -10.795),
        (31.980731599, -2.9, -21.820731599),
    ]]
    chamfer(chamfer1_edges, length=CHAMFER1_SIZE)


solid = part_3.part
